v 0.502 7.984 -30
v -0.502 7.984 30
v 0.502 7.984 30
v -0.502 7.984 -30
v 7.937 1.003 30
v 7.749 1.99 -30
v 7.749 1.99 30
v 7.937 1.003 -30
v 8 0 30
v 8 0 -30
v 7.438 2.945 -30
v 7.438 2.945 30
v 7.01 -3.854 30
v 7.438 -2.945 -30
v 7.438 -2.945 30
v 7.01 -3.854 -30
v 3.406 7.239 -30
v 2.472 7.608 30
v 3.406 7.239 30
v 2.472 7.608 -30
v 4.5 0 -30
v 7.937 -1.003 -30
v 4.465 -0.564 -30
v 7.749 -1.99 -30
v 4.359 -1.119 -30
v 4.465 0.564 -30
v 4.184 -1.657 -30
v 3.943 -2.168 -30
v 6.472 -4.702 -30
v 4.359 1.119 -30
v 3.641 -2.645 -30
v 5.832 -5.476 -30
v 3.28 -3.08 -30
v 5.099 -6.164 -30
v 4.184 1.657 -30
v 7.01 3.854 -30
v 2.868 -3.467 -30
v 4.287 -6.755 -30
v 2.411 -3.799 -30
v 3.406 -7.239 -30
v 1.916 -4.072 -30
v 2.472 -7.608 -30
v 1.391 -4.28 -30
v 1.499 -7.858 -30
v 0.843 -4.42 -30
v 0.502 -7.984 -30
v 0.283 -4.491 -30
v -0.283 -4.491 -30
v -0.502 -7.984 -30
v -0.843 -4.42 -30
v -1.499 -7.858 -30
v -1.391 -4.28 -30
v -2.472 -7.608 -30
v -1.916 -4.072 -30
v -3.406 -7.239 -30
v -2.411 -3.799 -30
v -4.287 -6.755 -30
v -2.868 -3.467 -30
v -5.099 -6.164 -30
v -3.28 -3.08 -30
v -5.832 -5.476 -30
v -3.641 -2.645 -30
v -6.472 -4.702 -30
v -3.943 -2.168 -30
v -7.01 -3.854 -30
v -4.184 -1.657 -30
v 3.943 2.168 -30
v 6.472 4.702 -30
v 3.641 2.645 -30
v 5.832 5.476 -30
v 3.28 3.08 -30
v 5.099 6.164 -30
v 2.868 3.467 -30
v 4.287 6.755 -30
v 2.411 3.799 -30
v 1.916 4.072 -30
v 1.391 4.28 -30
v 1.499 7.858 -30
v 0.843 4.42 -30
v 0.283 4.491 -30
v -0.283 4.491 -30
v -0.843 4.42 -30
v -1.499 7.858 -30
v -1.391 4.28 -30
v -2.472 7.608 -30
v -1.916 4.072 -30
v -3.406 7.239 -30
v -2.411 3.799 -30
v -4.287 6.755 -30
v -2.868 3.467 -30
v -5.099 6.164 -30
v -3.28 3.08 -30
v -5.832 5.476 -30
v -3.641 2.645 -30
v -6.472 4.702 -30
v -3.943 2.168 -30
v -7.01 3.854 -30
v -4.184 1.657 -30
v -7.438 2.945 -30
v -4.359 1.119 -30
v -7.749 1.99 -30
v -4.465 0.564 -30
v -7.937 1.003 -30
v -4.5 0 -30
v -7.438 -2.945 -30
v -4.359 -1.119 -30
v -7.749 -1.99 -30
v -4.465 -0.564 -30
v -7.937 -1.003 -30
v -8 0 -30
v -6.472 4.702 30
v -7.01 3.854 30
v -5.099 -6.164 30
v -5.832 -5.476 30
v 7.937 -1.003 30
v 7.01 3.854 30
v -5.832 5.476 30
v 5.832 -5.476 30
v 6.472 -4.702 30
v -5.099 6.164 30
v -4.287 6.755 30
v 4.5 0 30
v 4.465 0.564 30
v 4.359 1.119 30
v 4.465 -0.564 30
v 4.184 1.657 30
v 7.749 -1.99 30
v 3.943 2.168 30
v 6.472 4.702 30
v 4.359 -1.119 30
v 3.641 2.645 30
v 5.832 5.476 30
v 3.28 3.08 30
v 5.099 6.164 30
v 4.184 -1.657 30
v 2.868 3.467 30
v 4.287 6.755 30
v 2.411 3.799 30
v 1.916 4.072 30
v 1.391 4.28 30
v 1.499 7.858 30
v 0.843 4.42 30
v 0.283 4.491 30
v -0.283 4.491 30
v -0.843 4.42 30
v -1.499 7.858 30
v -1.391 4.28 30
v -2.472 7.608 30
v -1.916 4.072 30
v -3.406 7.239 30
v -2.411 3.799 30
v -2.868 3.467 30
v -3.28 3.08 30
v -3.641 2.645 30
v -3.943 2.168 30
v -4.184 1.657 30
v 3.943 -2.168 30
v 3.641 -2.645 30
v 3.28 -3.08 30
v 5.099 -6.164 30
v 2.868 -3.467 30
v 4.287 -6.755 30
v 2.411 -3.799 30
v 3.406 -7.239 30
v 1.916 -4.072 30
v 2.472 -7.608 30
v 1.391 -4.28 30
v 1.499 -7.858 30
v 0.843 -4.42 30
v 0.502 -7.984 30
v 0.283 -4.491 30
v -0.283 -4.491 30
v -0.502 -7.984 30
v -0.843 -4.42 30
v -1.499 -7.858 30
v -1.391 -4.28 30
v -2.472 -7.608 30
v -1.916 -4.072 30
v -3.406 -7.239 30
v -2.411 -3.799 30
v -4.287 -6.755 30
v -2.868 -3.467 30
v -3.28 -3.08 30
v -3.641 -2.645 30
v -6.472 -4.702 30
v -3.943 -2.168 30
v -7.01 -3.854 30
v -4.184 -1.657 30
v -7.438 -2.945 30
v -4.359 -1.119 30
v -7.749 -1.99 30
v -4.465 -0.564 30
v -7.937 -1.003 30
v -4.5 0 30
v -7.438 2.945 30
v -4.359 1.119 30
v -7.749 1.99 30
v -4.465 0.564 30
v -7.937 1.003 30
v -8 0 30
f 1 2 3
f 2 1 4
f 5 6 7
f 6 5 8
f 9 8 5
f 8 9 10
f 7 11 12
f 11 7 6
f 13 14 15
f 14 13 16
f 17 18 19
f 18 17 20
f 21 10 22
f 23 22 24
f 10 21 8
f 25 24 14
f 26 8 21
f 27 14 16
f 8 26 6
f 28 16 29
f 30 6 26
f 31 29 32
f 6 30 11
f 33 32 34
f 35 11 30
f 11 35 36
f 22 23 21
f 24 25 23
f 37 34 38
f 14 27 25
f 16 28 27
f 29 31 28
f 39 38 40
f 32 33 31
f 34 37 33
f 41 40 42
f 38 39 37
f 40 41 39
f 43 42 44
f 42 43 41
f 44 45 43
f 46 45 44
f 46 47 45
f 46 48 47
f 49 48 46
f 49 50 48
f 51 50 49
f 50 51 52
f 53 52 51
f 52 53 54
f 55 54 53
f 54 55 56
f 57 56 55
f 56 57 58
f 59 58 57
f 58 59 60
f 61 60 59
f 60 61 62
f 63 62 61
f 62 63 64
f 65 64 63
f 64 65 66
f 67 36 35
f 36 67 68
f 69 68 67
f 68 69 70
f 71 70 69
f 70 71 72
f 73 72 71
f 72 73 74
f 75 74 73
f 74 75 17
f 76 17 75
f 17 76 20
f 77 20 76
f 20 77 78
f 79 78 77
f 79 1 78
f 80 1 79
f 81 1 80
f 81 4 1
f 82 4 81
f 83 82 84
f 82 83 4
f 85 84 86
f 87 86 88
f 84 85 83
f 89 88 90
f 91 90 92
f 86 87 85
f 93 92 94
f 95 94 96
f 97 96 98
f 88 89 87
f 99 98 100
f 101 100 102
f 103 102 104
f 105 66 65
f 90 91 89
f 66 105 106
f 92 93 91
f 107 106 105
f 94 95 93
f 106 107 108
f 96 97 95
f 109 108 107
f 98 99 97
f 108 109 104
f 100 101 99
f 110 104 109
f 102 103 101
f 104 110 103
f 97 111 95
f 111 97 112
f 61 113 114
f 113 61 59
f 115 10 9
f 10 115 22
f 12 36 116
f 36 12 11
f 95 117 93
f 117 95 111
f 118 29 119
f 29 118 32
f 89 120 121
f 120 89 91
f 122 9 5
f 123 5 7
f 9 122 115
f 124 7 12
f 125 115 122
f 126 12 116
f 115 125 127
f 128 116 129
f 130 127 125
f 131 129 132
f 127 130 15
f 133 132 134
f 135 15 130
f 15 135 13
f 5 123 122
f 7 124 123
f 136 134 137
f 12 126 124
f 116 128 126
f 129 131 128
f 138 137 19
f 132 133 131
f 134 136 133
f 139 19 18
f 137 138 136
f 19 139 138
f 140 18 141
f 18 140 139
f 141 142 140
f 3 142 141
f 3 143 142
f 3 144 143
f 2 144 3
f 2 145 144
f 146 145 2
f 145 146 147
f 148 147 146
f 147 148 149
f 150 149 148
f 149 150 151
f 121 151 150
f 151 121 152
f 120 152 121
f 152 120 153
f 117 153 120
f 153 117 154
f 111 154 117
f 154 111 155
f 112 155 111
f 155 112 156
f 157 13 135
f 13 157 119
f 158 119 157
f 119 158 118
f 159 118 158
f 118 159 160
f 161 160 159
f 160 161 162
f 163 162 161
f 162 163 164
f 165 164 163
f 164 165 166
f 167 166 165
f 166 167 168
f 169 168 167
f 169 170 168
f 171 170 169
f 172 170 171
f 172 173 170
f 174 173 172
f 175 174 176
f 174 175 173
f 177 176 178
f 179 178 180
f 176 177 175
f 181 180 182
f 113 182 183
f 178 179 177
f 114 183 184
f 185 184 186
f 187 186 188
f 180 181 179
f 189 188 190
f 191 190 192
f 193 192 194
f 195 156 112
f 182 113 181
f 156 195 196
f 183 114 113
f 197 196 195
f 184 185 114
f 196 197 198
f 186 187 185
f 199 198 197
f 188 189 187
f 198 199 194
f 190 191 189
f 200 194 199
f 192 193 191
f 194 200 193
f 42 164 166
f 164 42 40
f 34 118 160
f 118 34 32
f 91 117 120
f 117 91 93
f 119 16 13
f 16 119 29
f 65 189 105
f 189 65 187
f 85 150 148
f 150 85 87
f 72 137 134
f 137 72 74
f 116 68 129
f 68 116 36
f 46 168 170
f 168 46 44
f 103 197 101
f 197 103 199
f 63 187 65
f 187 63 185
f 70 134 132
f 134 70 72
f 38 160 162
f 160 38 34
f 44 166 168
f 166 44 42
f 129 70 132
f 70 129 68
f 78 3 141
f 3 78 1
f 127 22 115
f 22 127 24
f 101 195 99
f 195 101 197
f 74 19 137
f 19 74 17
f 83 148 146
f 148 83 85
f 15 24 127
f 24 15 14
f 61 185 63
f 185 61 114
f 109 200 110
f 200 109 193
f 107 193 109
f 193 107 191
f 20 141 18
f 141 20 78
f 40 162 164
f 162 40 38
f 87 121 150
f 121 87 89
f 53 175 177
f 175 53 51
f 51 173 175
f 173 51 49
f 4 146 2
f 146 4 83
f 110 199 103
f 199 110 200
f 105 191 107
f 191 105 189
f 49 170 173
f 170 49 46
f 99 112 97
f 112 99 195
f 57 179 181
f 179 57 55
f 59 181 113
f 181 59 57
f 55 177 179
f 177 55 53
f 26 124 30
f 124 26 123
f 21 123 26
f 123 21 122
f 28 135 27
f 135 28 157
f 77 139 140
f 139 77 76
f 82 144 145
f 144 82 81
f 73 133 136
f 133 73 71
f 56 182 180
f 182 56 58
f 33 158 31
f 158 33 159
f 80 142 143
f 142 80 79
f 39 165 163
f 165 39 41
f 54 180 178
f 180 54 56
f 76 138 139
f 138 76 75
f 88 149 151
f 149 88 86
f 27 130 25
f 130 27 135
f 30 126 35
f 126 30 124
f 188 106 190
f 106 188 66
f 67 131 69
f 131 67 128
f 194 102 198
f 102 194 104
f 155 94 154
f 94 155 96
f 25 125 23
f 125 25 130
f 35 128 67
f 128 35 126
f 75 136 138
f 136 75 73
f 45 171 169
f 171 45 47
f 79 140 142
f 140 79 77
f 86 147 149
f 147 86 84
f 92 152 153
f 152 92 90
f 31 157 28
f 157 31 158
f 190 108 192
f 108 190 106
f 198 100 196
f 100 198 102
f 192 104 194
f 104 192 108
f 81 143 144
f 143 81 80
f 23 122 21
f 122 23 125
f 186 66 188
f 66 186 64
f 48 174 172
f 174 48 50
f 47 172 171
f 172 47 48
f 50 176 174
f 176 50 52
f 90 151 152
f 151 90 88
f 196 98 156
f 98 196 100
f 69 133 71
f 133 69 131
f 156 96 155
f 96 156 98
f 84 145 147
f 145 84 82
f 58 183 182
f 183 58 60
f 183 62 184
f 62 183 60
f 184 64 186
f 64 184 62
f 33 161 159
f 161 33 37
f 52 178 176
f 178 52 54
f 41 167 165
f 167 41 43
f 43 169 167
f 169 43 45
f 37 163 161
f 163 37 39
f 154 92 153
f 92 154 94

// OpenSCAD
$fn = 50;


difference() {
	union() {
		translate(v = [0, 0, -30.0000000000]) {
			cylinder(h = 60, r = 8.0000000000);
		}
	}
	union() {
		translate(v = [0, 0, -100.0000000000]) {
			cylinder(h = 200, r = 4.5000000000);
		}
	}
}
